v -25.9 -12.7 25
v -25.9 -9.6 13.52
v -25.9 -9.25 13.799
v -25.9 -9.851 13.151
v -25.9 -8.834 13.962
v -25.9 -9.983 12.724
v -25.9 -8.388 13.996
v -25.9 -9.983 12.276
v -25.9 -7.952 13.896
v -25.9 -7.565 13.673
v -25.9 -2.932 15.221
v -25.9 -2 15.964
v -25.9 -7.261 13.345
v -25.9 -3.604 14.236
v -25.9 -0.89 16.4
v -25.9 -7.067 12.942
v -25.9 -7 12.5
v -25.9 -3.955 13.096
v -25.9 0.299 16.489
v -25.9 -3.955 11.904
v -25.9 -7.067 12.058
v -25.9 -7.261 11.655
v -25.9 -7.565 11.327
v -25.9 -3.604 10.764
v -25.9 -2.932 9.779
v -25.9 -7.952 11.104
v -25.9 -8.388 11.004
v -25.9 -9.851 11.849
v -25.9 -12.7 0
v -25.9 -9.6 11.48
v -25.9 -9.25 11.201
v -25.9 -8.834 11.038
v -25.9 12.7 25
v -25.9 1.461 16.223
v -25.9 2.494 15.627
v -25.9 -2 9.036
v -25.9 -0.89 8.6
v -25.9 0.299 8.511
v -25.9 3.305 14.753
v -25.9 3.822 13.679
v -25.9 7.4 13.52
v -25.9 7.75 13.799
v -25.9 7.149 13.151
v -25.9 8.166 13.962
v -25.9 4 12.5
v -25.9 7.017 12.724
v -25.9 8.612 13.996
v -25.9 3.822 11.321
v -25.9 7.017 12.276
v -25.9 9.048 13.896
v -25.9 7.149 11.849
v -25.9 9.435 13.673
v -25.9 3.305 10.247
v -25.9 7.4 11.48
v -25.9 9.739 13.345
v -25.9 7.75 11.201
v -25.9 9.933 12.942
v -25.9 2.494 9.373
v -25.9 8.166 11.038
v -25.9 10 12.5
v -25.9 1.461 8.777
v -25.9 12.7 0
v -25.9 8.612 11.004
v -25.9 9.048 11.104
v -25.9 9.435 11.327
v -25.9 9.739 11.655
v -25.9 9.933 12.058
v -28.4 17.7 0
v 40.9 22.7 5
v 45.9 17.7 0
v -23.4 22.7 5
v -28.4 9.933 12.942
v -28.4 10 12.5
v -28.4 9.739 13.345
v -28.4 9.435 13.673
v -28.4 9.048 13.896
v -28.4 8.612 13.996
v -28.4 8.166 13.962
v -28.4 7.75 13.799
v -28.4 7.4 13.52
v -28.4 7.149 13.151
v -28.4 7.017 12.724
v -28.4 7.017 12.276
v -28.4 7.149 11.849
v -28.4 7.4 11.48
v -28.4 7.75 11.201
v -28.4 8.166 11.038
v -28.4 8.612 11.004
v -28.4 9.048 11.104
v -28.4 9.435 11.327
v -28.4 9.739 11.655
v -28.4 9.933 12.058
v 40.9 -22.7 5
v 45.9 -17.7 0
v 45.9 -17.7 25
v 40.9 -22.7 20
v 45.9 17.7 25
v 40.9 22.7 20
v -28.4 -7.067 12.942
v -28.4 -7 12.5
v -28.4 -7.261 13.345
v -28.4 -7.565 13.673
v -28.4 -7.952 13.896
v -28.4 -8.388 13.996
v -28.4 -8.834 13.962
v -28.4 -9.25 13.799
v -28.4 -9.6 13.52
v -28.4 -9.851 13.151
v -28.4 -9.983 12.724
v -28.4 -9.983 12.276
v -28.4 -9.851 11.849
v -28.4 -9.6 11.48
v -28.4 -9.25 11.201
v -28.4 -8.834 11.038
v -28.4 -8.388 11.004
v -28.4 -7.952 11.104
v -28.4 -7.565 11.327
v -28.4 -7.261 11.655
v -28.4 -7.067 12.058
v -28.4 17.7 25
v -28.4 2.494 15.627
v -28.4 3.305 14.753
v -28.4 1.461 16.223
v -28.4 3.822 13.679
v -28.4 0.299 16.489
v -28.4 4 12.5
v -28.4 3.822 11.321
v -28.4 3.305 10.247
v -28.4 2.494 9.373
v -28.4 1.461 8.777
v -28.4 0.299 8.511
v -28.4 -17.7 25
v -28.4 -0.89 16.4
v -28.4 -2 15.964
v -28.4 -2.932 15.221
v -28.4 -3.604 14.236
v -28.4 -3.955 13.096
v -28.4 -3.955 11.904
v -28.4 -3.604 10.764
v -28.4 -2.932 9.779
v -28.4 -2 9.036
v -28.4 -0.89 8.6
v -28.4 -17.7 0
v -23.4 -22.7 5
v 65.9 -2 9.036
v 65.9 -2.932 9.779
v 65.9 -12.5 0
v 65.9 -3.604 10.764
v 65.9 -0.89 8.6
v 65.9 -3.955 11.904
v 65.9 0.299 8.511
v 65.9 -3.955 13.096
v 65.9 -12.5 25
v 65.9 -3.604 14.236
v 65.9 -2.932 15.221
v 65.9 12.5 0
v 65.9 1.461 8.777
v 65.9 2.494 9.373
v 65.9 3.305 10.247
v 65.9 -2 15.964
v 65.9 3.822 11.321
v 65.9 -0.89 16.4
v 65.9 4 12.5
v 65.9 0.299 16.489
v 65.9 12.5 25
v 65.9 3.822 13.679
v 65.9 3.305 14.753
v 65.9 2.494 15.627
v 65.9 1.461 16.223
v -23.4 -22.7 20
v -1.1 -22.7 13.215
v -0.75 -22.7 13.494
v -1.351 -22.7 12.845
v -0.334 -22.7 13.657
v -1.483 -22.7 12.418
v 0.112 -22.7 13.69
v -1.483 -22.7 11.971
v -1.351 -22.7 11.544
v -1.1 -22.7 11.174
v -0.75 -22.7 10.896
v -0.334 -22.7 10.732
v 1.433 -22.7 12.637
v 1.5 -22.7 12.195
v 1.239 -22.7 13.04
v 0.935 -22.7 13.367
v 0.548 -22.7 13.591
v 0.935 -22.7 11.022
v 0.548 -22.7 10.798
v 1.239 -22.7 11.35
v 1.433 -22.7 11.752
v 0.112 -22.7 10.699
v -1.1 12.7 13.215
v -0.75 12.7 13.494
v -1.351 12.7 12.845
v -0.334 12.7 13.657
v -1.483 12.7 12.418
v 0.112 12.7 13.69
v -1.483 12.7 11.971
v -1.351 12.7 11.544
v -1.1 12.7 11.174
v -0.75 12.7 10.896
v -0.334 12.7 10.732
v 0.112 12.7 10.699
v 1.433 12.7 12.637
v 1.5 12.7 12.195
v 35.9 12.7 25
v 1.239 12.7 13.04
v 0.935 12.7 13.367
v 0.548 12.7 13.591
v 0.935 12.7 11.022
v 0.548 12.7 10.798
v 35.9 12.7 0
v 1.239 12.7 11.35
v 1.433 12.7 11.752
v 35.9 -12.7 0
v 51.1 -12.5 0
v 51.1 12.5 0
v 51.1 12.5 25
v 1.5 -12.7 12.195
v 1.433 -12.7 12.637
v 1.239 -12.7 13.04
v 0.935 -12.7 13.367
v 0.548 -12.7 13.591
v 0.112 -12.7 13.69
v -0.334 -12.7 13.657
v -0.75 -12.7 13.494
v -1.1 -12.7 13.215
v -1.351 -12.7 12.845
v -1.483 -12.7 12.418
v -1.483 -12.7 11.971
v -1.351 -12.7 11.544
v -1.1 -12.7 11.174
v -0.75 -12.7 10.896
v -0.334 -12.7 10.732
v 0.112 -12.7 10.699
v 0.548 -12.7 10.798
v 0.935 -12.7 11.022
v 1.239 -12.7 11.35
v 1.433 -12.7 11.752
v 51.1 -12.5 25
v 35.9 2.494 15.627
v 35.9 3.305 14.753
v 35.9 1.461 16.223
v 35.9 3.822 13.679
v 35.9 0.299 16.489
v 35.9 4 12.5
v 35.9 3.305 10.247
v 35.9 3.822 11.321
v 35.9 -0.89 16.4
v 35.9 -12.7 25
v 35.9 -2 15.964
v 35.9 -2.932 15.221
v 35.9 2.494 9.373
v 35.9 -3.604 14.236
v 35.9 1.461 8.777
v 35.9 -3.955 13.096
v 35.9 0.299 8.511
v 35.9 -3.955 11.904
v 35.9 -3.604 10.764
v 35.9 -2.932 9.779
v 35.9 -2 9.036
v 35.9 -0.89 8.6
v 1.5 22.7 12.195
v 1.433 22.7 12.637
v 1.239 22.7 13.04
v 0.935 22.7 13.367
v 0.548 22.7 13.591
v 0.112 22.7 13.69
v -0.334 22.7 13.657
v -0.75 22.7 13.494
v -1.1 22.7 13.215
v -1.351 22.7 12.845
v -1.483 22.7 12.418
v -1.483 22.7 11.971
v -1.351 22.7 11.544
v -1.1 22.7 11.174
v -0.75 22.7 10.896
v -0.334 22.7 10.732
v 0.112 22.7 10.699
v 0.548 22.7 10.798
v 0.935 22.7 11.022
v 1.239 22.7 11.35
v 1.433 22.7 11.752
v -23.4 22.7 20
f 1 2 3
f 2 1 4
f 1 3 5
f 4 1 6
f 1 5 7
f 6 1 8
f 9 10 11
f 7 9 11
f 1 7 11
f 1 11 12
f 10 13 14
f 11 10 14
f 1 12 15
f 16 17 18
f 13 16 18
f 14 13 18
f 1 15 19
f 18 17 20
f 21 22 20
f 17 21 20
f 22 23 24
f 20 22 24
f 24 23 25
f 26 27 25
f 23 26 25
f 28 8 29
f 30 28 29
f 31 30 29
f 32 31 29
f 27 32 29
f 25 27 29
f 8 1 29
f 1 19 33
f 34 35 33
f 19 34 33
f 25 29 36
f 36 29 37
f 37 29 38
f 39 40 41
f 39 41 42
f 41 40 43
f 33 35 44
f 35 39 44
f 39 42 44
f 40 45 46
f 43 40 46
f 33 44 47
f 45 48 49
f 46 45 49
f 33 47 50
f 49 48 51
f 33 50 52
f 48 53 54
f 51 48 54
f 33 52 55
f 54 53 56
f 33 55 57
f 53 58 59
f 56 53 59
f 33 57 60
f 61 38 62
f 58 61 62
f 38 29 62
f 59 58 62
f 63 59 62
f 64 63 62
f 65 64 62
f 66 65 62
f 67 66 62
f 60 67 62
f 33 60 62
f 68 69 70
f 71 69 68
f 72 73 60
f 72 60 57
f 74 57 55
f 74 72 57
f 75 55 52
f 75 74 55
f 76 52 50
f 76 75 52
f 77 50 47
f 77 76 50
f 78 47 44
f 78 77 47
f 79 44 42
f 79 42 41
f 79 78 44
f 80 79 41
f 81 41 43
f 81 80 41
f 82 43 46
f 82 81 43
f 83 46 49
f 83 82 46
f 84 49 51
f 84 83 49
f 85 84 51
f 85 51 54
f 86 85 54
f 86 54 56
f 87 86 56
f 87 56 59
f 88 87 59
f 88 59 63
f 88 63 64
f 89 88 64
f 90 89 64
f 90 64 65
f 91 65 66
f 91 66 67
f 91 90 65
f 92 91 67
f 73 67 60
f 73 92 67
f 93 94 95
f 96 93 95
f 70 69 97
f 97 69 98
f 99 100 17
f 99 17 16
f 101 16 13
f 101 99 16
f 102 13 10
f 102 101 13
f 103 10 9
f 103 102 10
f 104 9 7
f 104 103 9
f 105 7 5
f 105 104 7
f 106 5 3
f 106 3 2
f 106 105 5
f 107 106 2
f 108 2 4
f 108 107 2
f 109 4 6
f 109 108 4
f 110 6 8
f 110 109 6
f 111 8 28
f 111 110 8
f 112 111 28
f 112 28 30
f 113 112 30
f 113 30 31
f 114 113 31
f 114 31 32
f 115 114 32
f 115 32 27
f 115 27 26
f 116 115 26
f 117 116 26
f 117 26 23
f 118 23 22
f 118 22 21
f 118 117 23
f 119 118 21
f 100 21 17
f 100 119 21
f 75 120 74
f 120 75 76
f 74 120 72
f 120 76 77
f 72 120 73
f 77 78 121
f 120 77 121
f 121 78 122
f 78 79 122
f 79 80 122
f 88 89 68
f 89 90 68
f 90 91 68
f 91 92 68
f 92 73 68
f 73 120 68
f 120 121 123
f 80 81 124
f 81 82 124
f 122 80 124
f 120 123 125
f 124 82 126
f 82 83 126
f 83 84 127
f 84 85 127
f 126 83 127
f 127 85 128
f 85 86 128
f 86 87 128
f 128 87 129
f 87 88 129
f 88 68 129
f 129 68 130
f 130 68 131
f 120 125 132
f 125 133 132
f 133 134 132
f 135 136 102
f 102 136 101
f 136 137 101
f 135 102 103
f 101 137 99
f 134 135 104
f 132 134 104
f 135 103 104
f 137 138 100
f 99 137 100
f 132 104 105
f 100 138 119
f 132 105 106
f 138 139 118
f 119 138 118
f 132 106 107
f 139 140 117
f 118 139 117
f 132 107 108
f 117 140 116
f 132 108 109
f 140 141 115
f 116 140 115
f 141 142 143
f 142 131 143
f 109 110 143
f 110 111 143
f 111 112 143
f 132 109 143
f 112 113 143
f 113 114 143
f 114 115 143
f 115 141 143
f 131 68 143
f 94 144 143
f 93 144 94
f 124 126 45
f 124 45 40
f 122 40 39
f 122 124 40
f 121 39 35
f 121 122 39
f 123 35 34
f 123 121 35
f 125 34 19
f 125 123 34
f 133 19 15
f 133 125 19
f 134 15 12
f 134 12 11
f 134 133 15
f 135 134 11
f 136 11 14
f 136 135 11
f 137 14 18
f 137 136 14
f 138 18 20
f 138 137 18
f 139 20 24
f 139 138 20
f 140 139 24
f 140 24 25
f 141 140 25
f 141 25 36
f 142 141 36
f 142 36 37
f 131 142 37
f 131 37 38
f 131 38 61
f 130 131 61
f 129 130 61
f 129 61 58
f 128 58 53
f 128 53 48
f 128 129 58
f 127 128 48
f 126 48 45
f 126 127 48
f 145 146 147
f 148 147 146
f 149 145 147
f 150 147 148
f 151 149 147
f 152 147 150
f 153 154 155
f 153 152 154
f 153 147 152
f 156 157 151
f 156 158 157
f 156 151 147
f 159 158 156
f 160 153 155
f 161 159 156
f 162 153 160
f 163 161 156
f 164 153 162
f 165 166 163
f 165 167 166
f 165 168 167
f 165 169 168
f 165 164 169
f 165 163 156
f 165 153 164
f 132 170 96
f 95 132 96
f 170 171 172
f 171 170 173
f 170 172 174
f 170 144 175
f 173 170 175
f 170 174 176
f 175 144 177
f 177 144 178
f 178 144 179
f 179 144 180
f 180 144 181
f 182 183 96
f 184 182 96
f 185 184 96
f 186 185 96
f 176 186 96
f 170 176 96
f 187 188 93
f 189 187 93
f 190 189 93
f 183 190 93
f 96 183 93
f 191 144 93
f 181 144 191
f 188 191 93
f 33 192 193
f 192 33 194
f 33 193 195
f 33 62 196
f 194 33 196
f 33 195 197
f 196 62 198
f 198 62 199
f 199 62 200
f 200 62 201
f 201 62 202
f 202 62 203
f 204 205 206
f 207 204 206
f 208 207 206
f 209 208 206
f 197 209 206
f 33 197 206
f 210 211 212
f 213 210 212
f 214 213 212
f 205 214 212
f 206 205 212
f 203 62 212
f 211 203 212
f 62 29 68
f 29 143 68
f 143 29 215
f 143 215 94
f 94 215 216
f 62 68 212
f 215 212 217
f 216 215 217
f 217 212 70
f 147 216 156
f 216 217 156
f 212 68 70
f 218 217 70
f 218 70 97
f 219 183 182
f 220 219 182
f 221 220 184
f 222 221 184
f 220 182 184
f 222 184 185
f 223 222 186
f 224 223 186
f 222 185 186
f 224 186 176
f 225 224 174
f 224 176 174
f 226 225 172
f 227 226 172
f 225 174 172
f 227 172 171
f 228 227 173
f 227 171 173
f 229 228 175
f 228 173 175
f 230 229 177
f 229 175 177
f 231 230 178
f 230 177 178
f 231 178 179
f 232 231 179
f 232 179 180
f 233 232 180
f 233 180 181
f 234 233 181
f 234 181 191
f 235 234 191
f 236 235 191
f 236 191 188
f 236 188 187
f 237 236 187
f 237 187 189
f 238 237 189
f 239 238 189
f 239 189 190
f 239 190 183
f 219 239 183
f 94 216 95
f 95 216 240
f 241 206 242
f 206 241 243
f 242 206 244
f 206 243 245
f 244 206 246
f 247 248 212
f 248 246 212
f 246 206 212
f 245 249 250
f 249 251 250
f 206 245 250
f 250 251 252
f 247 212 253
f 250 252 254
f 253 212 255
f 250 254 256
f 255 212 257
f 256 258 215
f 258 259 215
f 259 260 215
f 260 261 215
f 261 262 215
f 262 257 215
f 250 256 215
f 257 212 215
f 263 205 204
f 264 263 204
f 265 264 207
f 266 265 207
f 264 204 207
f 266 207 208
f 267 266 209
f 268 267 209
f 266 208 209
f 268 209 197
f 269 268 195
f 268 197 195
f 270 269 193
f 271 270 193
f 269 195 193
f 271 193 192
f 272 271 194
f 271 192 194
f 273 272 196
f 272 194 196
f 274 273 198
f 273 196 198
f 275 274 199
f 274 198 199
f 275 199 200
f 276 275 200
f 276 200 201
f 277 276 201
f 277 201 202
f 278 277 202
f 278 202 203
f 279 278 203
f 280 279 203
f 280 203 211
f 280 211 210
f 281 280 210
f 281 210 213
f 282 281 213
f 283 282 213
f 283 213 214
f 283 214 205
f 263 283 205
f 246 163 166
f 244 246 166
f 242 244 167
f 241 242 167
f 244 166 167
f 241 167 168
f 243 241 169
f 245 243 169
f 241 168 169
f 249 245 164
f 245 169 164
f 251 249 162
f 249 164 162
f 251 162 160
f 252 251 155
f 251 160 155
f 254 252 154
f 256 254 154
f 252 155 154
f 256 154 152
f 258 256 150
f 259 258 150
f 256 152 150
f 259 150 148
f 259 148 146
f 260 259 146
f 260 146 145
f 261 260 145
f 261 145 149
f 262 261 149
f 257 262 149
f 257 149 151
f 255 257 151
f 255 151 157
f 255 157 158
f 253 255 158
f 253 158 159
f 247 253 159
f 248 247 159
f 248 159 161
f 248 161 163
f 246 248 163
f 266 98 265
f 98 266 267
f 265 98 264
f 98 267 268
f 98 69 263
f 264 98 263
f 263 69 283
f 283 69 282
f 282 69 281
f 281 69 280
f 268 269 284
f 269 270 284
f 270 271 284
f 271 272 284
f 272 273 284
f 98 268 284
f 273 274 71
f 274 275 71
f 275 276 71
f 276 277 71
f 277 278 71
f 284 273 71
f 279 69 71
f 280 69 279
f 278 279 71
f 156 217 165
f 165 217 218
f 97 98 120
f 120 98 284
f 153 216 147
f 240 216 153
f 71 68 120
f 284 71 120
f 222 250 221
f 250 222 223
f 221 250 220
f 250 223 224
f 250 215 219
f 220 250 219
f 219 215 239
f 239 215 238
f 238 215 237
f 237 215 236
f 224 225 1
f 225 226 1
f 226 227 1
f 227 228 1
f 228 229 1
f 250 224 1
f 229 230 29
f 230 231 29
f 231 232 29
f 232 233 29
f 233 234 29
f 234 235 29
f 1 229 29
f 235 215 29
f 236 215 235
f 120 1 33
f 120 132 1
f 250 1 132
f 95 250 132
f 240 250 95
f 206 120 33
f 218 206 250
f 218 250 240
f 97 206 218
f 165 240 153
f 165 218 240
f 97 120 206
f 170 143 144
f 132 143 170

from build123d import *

# Parameters (mm, degrees)
F0_W      = 2.5
F0_H      = 24.4
F1_DEPTH  = 25
F4_R      = 1.5
F4_R_2    = 4
F5_DEPTH  = 2.5
F6_SIZE   = 5
F10_R     = 1.5
F11_DEPTH = 60
F8_W      = 25
F8_H      = 25
F12_DEPTH = 20
F13_SIZE  = 5.19999
F15_R     = 4
F16_DEPTH = 40


# Not quite as in the source:
# - a fillet or chamfer is up to 0.001 mm smaller than in the source, because OpenCascade refuses the exact size


with BuildPart() as f1:
    # F0 (on Top) → F1 (new body)
    with BuildSketch(Plane.XY):
        Polygon((-28.4, 12.2), (-25.9, 12.2), (-25.9, 12.7), (35.9, 12.7), (35.9, -12.7), (-25.9, -12.7), (-25.9, -12.2), (-28.4, -12.2), (-28.4, -22.7), (45.9, -22.7), (45.9, 22.7), (-28.4, 22.7), align=None)
        with Locations((-27.15, 0)):
            Rectangle(F0_W, F0_H)
    extrude(amount=F1_DEPTH)

    # F4 (on offset) → F5 (cut)
    with BuildSketch(Plane.YZ.offset(-28.4)):
        with Locations((-8.5, 12.5)):
            Circle(F4_R)
        with Locations((0, 12.5)):
            Circle(F4_R_2)
        with Locations((8.5, 12.5)):
            Circle(F4_R)
    extrude(amount=F5_DEPTH, mode=Mode.SUBTRACT)

    # F6
    f6_edges = [f1.edges().sort_by_distance(p)[0] for p in [
        (45.9, 22.7, 12.5),
        (-28.4, 22.7, 12.5),
        (8.75, 22.7, 0),
        (8.75, 22.7, 25),
        (-28.4, -22.7, 12.5),
        (45.9, -22.7, 12.5),
        (8.75, -22.7, 0),
        (8.75, -22.7, 25),
    ]]
    chamfer(f6_edges, length=F6_SIZE)

    # F10 (on offset) → F11 (cut)
    with BuildSketch(Plane.XZ.offset(22.7)):
        with Locations((0, 12.1945459396)):
            Circle(F10_R)
    extrude(amount=-F11_DEPTH, mode=Mode.SUBTRACT)

    # F8 (on offset) → F12 (join)
    with BuildSketch(Plane.YZ.offset(45.9)):
        with Locations((0, 12.5)):
            Rectangle(F8_W, F8_H)
    extrude(amount=F12_DEPTH)

    # F13 (size 5.2 in the source; OpenCascade refuses exactly that, so slightly less here)
    f13_edges = [f1.edges().sort_by_distance(p)[0] for p in [
        (45.9, 12.5, 12.5),
        (45.9, -12.5, 12.5),
    ]]
    chamfer(f13_edges, length=F13_SIZE)

    # F15 (on offset) → F16 (cut)
    with BuildSketch(Plane.YZ.offset(65.9)):
        with Locations((0, 12.5)):
            Circle(F15_R)
    extrude(amount=-F16_DEPTH, mode=Mode.SUBTRACT)


solid = f1.part
